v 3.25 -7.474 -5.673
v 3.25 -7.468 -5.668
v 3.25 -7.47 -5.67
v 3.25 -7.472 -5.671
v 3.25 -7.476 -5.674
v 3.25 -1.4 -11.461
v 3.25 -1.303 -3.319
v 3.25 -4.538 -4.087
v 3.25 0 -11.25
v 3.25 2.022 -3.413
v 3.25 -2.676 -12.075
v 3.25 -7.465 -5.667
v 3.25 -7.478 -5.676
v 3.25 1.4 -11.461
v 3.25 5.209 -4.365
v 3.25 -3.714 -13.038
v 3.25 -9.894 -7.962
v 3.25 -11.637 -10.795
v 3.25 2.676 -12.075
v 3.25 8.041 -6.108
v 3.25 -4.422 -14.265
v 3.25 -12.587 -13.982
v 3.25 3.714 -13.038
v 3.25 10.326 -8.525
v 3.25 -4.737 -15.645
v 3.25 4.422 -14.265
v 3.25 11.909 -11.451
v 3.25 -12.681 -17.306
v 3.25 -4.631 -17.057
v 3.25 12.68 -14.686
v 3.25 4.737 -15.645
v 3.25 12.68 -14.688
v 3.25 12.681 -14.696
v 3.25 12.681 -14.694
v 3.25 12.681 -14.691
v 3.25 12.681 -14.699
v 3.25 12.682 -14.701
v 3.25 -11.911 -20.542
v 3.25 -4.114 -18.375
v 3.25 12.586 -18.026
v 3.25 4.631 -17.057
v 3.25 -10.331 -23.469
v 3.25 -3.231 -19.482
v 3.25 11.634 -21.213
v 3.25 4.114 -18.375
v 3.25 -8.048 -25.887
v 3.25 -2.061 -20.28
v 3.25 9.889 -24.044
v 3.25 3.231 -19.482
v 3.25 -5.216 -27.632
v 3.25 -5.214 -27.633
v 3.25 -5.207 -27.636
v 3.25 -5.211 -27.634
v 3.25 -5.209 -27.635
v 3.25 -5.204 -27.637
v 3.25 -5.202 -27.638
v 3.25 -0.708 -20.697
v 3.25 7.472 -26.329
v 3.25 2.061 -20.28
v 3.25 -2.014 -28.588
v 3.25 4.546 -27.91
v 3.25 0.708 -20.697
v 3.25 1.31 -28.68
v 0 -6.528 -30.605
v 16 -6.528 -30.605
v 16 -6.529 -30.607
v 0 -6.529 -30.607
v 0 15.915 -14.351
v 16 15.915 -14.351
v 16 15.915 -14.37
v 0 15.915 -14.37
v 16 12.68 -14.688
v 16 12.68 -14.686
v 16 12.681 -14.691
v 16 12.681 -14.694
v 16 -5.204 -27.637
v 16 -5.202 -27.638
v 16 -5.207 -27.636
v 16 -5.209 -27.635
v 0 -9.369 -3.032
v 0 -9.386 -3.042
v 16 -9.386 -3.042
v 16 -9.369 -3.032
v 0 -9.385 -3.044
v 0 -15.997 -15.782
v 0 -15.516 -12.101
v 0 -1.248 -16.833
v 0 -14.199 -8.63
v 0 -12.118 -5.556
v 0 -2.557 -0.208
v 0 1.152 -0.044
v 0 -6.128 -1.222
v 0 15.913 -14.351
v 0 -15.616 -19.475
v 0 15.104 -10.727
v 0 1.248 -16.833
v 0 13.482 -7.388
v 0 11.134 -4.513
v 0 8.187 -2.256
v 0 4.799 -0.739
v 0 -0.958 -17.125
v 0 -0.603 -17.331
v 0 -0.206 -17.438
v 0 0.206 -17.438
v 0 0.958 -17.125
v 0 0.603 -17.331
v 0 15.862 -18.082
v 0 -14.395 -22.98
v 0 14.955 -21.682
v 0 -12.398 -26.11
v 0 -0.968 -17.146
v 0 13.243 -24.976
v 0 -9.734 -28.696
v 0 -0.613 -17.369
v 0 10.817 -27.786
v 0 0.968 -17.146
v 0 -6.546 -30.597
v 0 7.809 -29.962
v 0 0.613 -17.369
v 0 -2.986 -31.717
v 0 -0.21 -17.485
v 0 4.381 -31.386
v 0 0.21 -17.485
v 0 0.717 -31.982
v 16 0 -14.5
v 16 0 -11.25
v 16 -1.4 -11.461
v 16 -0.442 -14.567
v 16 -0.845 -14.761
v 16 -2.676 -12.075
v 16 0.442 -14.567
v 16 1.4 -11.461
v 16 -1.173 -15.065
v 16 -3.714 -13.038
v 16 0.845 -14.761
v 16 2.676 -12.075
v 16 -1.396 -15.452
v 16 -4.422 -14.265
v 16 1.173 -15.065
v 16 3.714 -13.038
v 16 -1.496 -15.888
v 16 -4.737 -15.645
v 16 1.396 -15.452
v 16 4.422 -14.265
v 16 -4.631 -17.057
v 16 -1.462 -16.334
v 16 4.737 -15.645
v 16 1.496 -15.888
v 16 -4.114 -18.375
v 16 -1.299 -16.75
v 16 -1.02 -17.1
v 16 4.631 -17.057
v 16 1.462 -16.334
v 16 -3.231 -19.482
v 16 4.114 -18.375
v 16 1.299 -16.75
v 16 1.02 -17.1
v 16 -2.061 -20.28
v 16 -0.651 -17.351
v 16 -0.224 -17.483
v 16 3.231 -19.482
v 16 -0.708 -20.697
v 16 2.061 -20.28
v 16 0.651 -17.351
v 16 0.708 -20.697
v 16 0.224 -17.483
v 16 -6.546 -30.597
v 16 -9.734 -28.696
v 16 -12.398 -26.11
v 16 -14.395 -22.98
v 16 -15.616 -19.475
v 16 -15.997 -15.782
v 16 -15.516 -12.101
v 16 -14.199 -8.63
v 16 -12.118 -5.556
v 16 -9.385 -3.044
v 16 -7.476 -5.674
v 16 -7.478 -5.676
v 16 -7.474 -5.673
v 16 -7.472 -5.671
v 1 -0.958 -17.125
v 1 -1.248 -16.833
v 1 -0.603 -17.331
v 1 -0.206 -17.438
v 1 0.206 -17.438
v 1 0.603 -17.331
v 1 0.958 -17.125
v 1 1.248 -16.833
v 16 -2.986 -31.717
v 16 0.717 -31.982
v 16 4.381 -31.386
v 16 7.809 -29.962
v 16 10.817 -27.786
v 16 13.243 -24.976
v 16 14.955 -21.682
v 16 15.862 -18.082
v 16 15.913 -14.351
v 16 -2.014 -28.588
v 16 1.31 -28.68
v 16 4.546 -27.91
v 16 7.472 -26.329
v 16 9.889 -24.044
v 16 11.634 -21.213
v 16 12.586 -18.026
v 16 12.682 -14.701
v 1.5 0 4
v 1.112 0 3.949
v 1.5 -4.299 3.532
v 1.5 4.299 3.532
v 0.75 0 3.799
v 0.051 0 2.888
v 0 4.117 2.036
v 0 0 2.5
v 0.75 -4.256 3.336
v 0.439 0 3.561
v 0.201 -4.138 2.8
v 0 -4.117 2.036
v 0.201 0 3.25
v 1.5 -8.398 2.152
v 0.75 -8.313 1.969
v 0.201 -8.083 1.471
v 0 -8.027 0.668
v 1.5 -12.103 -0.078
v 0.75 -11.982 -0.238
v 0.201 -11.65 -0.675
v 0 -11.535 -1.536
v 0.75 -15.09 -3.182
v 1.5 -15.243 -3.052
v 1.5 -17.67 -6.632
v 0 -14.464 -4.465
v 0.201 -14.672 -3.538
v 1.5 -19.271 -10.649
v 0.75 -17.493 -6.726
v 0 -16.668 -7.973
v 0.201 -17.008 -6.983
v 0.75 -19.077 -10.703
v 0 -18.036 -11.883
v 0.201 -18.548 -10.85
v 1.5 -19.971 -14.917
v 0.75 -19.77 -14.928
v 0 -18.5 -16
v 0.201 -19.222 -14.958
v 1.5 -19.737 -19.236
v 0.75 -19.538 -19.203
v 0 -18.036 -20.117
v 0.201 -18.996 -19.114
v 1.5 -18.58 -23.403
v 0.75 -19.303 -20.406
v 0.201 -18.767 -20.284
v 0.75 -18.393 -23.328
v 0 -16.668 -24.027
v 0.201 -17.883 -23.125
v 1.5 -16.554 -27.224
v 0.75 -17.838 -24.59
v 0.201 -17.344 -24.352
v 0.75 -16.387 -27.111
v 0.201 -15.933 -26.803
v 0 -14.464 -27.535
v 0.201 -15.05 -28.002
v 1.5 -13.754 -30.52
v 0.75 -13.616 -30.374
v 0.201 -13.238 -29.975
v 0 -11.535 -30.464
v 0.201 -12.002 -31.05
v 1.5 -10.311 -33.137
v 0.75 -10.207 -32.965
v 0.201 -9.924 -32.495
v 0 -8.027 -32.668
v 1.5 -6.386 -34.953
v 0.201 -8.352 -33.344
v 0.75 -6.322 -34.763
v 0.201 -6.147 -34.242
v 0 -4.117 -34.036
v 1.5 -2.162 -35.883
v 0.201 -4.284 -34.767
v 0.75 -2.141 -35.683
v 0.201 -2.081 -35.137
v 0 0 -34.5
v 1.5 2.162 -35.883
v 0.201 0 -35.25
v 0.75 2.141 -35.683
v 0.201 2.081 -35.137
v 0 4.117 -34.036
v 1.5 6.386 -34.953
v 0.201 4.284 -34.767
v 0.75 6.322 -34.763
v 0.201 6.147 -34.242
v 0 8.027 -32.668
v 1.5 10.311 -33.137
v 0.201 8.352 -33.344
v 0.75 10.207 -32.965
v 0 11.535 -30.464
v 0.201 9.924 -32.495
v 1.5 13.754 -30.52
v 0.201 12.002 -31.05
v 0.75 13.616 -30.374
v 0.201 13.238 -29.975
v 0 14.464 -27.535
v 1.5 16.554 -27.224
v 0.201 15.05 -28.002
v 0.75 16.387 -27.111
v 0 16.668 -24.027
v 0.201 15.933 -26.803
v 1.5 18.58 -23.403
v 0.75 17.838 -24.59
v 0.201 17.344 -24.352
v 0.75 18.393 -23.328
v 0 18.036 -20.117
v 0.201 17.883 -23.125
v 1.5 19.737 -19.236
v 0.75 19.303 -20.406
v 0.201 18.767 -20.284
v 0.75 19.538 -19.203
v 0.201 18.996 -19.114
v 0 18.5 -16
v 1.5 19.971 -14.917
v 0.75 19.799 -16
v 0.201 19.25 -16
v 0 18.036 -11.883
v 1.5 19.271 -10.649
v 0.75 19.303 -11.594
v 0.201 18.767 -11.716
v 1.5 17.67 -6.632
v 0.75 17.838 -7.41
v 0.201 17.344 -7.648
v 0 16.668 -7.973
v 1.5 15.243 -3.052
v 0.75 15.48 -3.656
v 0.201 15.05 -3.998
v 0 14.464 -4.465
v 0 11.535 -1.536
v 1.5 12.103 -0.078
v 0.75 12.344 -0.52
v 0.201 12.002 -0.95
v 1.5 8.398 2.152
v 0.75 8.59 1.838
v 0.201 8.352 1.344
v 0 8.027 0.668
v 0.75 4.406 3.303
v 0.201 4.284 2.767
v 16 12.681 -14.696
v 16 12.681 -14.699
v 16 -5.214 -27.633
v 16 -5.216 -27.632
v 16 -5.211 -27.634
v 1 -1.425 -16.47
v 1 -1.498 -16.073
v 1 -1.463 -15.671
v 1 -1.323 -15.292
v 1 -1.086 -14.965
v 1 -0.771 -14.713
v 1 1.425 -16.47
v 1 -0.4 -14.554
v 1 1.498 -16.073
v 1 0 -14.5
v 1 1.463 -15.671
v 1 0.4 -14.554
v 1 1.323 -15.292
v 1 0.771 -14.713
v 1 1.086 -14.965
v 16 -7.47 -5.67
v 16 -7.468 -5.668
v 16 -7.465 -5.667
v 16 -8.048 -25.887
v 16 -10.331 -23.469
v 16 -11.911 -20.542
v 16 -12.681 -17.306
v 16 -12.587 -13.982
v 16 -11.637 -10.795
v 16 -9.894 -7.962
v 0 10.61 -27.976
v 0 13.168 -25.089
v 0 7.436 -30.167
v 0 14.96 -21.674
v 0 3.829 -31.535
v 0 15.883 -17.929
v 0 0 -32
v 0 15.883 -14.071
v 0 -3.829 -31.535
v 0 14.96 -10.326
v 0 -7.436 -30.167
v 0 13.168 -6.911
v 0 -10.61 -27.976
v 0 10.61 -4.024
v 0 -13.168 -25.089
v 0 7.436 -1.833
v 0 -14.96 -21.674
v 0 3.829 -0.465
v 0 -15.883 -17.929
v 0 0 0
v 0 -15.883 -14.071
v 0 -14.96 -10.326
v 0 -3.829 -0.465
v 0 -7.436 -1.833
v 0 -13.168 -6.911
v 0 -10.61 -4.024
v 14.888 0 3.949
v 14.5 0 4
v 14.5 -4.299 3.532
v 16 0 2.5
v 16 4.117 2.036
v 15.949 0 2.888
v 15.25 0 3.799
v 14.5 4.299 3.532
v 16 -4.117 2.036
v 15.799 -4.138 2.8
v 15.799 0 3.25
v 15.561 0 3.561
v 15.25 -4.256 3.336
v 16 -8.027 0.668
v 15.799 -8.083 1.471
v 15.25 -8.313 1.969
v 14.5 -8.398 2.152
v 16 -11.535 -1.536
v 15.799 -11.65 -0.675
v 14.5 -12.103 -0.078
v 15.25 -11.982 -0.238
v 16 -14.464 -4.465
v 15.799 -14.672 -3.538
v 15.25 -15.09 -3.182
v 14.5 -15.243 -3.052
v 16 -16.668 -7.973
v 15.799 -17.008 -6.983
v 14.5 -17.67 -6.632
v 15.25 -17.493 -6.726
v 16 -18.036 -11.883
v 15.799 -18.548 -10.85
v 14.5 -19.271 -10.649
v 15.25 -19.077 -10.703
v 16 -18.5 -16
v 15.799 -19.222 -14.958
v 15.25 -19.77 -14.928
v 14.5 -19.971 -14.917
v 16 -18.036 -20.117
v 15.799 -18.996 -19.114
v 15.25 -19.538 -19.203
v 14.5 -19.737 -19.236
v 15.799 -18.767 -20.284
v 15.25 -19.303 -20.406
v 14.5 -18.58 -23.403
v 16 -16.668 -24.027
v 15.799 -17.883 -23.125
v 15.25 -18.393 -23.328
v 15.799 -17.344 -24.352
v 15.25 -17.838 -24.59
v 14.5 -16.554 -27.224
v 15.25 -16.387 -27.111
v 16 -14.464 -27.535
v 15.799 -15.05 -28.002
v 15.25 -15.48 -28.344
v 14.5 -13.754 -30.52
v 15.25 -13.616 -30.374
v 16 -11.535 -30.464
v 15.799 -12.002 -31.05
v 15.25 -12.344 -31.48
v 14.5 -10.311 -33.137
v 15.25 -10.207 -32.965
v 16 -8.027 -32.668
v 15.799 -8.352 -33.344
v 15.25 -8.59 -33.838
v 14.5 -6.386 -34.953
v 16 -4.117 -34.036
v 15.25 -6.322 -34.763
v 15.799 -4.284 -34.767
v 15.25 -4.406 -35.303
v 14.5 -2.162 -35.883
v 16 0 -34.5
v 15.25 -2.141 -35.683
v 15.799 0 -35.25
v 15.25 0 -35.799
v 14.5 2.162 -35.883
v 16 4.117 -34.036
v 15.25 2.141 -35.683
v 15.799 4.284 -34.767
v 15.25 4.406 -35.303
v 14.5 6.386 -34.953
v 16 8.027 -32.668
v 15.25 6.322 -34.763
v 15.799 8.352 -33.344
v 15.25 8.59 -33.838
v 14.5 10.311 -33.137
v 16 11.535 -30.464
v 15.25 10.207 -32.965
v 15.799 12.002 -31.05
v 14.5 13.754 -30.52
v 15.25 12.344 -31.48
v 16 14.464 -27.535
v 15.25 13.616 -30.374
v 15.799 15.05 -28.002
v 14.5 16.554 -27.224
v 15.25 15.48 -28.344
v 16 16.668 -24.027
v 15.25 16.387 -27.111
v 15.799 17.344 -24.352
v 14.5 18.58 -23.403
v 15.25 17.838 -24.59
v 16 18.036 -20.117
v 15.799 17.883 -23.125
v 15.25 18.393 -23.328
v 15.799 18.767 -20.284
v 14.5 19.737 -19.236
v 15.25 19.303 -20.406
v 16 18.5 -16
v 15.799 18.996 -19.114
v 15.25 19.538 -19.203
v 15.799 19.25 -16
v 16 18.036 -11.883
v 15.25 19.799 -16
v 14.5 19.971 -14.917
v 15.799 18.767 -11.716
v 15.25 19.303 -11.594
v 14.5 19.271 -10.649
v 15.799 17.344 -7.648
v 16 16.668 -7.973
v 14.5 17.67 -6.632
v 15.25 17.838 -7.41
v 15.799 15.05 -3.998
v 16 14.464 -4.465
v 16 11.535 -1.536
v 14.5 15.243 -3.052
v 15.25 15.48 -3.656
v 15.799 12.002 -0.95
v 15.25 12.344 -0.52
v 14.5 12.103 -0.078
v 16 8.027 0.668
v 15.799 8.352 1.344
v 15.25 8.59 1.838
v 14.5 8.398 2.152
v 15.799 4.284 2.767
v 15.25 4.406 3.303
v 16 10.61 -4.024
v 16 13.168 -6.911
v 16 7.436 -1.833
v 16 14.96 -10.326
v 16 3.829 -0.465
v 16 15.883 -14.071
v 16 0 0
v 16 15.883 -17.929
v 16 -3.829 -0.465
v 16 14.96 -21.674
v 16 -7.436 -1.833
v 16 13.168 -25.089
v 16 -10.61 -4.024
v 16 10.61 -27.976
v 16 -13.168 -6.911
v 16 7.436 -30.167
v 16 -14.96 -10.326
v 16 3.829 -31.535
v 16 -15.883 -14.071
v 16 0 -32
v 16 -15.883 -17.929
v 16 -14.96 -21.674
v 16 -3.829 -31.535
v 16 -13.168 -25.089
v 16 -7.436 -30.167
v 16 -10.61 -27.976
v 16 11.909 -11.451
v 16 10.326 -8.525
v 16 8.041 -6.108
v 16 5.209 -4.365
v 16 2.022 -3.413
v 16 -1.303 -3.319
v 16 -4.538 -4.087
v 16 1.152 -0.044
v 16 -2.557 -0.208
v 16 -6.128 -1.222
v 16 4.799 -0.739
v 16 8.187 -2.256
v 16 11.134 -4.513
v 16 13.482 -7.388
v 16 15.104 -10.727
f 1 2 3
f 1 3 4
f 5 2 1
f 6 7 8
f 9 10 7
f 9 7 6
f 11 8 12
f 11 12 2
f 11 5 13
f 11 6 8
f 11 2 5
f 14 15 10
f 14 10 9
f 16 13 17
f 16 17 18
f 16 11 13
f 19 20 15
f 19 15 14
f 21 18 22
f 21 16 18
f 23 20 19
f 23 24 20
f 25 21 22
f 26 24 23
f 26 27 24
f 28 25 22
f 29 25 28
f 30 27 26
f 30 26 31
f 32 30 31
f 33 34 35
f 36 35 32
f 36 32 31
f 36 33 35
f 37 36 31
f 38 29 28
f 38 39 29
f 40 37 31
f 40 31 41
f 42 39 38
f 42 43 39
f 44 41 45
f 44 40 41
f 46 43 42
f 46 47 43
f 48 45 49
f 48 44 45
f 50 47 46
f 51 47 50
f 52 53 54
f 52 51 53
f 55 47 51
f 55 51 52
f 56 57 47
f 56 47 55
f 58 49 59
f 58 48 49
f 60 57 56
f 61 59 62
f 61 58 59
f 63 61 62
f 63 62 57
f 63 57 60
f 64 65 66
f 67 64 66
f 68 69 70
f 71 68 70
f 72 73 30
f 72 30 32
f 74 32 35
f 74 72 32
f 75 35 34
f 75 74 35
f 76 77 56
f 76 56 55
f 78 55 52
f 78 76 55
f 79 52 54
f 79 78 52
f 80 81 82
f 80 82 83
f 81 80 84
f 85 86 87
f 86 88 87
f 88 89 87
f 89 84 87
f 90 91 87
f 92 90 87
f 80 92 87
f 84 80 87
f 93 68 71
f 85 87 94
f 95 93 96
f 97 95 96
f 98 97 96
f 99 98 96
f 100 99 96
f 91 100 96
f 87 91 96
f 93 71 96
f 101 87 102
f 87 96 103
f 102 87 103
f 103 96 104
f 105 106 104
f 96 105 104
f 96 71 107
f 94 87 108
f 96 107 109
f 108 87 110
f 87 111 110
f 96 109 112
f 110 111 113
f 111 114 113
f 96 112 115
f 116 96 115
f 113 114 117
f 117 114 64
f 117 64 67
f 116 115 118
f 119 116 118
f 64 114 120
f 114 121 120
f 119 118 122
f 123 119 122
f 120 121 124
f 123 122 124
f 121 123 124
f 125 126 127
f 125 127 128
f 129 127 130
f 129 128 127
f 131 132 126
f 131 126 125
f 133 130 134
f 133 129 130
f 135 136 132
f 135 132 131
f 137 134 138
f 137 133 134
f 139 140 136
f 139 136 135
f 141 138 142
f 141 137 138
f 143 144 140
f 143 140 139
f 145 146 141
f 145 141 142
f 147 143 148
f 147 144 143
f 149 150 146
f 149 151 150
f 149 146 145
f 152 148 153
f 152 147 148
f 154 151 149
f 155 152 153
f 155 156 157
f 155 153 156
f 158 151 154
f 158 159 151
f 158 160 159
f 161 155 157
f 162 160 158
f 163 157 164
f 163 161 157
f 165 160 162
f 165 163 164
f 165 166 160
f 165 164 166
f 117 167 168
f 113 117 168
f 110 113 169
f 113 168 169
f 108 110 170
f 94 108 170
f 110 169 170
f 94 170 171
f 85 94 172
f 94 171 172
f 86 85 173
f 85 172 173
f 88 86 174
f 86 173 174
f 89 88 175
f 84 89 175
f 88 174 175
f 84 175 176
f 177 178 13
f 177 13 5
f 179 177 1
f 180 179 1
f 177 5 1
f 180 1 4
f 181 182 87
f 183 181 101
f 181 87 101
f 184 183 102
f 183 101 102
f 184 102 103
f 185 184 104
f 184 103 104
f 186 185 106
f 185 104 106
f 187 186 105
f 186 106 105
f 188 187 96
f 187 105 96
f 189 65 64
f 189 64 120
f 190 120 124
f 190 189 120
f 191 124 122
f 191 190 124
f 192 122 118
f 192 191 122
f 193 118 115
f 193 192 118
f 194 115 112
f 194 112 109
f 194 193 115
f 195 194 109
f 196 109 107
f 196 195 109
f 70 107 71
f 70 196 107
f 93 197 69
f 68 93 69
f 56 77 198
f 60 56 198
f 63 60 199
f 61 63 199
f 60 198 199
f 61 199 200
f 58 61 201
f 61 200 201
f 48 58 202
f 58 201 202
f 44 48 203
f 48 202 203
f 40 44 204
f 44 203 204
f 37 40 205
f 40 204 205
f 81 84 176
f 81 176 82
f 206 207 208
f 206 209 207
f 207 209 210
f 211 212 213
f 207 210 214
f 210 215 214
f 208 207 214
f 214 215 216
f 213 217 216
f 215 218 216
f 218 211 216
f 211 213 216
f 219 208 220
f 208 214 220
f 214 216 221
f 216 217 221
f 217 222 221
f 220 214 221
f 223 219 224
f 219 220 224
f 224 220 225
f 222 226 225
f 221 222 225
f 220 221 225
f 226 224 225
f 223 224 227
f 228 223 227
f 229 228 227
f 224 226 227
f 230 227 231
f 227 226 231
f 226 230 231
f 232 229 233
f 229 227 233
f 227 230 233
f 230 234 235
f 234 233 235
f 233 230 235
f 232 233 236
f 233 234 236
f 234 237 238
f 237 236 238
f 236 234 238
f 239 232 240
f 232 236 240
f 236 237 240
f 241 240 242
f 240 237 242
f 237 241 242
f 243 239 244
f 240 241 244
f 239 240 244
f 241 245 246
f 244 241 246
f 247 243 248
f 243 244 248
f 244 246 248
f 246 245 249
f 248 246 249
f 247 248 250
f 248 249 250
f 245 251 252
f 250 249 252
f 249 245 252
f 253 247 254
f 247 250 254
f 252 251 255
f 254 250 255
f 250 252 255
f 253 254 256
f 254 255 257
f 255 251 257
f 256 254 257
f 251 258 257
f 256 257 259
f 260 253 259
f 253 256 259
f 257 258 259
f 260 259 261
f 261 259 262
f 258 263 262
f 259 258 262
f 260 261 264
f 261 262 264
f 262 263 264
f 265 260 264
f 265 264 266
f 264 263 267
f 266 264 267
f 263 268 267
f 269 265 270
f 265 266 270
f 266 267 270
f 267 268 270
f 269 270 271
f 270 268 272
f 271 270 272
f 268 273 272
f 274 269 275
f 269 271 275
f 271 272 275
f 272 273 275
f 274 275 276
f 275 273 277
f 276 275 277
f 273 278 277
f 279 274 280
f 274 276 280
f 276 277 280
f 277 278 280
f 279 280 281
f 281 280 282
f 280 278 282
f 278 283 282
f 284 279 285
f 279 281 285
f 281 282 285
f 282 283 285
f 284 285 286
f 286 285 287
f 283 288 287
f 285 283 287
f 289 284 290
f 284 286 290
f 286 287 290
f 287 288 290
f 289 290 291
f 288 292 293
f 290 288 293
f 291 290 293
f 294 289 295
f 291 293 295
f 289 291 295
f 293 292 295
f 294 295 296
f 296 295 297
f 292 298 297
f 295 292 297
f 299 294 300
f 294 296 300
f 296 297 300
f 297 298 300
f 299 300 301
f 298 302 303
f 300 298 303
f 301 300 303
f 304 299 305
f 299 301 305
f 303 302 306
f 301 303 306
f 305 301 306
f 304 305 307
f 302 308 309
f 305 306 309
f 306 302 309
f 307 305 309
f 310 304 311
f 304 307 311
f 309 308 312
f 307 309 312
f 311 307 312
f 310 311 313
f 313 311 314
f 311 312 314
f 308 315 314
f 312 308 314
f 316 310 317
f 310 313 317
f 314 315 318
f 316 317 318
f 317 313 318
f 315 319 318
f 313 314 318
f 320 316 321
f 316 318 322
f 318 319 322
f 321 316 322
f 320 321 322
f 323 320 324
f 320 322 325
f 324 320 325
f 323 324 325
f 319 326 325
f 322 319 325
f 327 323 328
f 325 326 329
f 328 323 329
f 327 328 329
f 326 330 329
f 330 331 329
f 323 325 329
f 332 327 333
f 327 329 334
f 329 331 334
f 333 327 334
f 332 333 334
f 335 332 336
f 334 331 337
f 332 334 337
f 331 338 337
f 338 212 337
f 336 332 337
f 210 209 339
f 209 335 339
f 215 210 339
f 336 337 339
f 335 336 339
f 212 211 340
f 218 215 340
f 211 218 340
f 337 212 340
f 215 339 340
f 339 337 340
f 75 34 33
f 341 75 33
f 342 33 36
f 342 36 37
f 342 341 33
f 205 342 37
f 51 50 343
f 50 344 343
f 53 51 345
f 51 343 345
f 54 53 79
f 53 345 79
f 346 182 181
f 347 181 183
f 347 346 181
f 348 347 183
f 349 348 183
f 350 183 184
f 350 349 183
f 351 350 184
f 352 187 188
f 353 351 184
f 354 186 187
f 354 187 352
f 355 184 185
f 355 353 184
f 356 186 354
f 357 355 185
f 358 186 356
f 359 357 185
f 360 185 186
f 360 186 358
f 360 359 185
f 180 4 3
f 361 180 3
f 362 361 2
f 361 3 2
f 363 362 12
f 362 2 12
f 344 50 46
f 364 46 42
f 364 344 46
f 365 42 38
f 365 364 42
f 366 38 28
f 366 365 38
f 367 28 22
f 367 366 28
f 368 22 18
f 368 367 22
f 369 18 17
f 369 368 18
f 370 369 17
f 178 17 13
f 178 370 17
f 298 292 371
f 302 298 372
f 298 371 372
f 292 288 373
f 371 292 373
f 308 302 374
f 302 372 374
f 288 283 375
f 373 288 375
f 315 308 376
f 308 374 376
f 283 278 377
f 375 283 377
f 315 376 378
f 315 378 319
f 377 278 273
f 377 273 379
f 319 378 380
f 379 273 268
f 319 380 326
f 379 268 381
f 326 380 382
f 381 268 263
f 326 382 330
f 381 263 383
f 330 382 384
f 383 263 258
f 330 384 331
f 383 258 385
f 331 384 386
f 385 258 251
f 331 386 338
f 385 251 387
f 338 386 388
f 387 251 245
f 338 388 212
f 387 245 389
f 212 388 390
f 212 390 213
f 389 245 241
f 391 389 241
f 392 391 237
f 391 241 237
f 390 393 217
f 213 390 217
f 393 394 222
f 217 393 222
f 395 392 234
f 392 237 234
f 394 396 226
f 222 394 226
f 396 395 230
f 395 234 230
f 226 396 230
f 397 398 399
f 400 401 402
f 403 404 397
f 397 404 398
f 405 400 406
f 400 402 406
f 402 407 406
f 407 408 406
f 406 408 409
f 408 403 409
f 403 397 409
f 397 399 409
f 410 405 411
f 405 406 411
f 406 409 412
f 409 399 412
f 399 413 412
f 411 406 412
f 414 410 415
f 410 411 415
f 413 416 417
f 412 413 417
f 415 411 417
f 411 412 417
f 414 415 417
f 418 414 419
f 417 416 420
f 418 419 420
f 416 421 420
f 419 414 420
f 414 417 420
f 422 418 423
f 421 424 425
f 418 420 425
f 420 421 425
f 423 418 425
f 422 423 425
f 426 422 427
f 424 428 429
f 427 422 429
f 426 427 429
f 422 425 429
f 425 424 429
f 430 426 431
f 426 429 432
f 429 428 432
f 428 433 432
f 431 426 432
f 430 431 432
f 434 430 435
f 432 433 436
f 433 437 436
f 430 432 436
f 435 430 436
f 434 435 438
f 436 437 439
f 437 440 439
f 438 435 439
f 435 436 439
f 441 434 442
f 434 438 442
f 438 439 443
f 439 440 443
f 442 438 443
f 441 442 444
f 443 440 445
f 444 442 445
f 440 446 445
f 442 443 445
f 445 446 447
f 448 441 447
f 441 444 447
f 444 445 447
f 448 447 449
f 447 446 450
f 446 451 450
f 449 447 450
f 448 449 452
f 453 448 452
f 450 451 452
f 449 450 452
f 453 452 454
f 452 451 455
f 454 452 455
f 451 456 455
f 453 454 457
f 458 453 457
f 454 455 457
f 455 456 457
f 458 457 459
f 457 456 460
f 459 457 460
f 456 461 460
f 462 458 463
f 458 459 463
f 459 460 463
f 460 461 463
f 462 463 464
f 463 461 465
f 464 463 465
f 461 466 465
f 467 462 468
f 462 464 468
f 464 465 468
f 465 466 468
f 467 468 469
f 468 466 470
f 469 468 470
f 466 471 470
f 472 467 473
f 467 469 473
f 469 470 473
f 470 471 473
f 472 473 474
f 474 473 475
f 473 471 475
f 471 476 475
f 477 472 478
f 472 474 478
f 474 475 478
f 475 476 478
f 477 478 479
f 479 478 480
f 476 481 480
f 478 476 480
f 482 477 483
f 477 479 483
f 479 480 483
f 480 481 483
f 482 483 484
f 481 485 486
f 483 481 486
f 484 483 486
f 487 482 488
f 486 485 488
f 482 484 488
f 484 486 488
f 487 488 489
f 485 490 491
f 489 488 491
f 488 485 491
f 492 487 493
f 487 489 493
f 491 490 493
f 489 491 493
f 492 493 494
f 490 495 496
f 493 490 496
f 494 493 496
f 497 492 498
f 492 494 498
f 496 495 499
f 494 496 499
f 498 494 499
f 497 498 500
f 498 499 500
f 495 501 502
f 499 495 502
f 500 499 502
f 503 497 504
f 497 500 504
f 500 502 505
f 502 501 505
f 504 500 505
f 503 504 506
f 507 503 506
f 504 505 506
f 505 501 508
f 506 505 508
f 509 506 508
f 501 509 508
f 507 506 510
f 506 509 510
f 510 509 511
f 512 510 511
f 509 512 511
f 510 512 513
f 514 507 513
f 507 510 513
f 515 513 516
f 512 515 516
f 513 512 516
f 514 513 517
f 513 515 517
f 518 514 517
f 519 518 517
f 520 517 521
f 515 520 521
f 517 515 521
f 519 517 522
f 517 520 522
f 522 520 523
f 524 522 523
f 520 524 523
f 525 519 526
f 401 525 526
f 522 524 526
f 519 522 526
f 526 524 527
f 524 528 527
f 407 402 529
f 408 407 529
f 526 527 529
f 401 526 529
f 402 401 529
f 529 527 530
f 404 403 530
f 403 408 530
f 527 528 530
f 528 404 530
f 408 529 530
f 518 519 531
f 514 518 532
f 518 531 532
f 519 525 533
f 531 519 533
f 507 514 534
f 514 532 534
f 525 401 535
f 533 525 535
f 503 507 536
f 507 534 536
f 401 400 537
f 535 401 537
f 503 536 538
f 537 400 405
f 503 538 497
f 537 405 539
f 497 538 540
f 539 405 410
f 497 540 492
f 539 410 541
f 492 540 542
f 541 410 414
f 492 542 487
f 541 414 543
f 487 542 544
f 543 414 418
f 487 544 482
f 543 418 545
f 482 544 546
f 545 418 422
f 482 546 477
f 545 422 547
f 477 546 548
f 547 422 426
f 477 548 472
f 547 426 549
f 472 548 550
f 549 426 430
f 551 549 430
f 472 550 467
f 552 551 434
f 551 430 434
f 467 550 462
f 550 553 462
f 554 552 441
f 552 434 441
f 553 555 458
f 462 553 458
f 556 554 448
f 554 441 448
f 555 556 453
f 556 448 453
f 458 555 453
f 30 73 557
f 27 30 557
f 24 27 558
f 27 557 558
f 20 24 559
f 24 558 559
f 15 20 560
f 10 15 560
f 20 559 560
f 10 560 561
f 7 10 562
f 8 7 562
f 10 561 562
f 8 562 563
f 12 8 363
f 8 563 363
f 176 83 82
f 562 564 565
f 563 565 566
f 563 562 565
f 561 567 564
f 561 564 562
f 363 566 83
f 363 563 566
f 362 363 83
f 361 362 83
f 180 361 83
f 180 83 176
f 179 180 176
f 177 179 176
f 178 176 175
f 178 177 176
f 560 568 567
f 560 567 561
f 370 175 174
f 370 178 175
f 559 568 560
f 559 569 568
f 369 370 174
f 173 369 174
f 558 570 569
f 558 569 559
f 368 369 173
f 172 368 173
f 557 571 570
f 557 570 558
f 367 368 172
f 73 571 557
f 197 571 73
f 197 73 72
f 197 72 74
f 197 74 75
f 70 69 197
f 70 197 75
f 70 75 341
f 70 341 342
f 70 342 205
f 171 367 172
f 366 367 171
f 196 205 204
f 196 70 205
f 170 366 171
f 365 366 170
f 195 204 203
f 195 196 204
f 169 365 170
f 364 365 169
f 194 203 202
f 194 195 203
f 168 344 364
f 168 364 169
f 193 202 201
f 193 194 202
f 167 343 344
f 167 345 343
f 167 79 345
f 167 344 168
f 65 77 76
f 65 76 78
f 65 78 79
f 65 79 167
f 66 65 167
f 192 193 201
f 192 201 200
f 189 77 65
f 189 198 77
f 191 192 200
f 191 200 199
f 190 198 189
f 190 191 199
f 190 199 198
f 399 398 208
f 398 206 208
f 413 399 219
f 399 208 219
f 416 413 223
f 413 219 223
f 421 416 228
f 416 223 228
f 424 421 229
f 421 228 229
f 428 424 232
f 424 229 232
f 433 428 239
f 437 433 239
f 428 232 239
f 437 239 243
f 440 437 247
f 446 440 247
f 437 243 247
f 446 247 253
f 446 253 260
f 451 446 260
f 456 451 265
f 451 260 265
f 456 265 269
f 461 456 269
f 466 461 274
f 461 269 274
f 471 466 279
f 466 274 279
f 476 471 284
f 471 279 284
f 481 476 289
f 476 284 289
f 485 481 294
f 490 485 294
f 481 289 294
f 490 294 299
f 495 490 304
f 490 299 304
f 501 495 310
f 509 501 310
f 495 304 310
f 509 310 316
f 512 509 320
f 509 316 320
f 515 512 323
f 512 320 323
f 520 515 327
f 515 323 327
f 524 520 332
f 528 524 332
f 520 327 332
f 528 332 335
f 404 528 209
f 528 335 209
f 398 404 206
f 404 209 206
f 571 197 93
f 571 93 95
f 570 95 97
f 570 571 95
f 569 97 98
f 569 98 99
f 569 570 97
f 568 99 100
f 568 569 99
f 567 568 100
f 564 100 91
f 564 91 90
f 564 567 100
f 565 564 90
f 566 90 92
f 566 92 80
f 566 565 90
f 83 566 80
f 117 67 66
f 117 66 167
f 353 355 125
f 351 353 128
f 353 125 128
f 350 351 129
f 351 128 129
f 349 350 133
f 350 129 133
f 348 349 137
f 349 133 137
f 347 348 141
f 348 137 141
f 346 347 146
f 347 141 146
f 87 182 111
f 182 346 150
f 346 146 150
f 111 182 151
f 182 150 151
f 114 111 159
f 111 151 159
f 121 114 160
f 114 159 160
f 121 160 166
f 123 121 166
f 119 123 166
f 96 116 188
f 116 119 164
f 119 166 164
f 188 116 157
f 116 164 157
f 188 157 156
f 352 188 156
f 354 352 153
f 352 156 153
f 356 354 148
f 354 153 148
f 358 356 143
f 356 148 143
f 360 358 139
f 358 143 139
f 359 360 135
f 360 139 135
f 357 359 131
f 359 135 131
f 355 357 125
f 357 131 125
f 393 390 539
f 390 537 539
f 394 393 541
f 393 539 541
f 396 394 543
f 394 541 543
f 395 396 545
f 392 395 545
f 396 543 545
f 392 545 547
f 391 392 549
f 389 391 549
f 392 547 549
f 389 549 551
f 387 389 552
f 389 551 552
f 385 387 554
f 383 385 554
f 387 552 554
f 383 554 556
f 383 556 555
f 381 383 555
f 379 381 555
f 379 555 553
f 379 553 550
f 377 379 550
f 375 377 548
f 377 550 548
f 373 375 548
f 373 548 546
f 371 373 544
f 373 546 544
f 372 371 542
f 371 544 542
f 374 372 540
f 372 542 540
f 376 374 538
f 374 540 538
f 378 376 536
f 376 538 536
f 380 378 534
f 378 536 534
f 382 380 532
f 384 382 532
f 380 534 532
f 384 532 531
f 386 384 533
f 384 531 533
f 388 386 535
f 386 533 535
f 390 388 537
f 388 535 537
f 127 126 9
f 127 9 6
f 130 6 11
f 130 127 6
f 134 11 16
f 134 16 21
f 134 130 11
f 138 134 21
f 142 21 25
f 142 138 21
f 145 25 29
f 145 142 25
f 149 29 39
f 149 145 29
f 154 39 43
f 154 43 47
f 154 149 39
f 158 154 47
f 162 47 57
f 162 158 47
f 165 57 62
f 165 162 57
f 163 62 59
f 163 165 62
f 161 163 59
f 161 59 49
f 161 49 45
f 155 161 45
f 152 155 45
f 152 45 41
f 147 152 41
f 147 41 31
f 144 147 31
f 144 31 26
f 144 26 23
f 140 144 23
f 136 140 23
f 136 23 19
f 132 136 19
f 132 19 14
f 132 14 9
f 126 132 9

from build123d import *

# Parameters (mm, degrees)
F0_W      = 4
F0_H      = 1.5
F0_W_2    = 6
F0_H_2    = 2.5
F3_DEPTH  = 4
F4_R      = 1.5666851265
F5_DEPTH  = 1
F3_FACE_W = 4
F3_FACE_H = 10.6617561789
F7_DEPTH  = 6
F8_DEPTH  = 6
F9_T      = -3.25


with BuildPart() as f1:
    # F0 (on Front) → F1 (revolve)
    with BuildSketch(Plane.XZ):
        with BuildLine():
            Line((0, 2.5), (0, 0))
            Line((0, 0), (6, 0))
            Line((6, 0), (10, 0))
            Line((10, 0), (16, 0))
            Line((16, 0), (16, 2.5))
            ThreePointArc((16, 2.5), (15.5606601718, 3.5606601718), (14.5, 4))
            Line((14.5, 4), (1.5, 4))
            ThreePointArc((1.5, 4), (0.4393398282, 3.5606601718), (0, 2.5))
        make_face()
    revolve(axis=Axis((8, 0, -16), (1, 0, 0)))


with BuildPart() as f1b:
    # F0 (on Front) → F1, piece 2 (revolve)
    with BuildSketch(Plane.XZ):
        with Locations((8, -13.75)):
            Rectangle(F0_W, F0_H)
        with Locations((3, -13.75)):
            Rectangle(F0_W_2, F0_H)
        with Locations((8, -11.75)):
            Rectangle(F0_W, F0_H_2)
        with Locations((13, -13.75)):
            Rectangle(F0_W_2, F0_H)
    revolve(axis=Axis((8, 0, -16), (1, 0, 0)))

    # F2 (on face) → F3 (join)
    with BuildSketch(Plane(origin=(6, 0, 0), x_dir=(0, -1, 0), z_dir=(-1, 0, 0))):
        with BuildLine():
            Line((6.6908253366, -1.4861596642), (1.3844372123, -10.6770935002))
            ThreePointArc((1.3844372123, -10.6770935002), (2.8339033039, -11.2862974145), (4.051778006, -12.2807131073))
            Line((4.051778006, -12.2807131073), (9.3857185908, -3.0420570099))
            Line((9.3857185908, -3.0420570099), (6.6908253366, -1.4861596642))
        make_face()
        with BuildLine():
            ThreePointArc((4.037854872, -19.7343979479), (2.741097896, -20.7682682731), (1.1951079301, -21.36858613))
            Line((1.1951079301, -21.36858613), (6.5290485149, -30.6072422274))
            Line((6.5290485149, -30.6072422274), (9.3687329614, -28.9677496478))
            Line((9.3687329614, -28.9677496478), (4.037854872, -19.7343979479))
        make_face()
        with BuildLine():
            ThreePointArc((-5.3019908569, -17.4624954541), (-5.4991378368, -15.9026190397), (-5.246885936, -14.3507007627))
            Line((-5.246885936, -14.3507007627), (-15.9147671056, -14.3507007627))
            Line((-15.9147671056, -14.3507007627), (-15.9147671056, -17.4624954541))
            Line((-15.9147671056, -17.4624954541), (-5.3019908569, -17.4624954541))
        make_face()
    extrude(amount=-F3_DEPTH)

    # F4 (on Right) → F5 (join)
    with BuildSketch(Plane.YZ):
        with Locations((0, -15.8851090819)):
            Circle(F4_R)
    extrude(amount=F5_DEPTH)

    # F3_face (on face) → F6 (revolve)
    with BuildSketch(Plane(origin=(8, -6.7032939167, -24.3510737978), x_dir=(1, 0, 0), z_dir=(0, -0.8660254038, 0.5))):
        Rectangle(F3_FACE_W, F3_FACE_H)
    revolve(axis=Axis((16, 0, -16), (1, 0, 0)))

    # F7 (add): a face of the model
    f7_faces = [f1b.faces().sort_by_distance(p)[0] for p in [
        (10, 6.3521420728, -1.8115251344),
    ]]
    extrude(f7_faces, amount=F7_DEPTH)

    # F8 (add): a face of the model
    f8_faces = [f1b.faces().sort_by_distance(p)[0] for p in [
        (6, 0, -19.4524914923),
    ]]
    extrude(f8_faces, amount=F8_DEPTH)

    # F9
    f9_openings = [f1b.faces().sort_by_distance(p)[0] for p in [
        (16, 0, -17.952491),
    ]]
    offset(amount=F9_T, openings=f9_openings)


solid = Compound([f1.part, f1b.part])
